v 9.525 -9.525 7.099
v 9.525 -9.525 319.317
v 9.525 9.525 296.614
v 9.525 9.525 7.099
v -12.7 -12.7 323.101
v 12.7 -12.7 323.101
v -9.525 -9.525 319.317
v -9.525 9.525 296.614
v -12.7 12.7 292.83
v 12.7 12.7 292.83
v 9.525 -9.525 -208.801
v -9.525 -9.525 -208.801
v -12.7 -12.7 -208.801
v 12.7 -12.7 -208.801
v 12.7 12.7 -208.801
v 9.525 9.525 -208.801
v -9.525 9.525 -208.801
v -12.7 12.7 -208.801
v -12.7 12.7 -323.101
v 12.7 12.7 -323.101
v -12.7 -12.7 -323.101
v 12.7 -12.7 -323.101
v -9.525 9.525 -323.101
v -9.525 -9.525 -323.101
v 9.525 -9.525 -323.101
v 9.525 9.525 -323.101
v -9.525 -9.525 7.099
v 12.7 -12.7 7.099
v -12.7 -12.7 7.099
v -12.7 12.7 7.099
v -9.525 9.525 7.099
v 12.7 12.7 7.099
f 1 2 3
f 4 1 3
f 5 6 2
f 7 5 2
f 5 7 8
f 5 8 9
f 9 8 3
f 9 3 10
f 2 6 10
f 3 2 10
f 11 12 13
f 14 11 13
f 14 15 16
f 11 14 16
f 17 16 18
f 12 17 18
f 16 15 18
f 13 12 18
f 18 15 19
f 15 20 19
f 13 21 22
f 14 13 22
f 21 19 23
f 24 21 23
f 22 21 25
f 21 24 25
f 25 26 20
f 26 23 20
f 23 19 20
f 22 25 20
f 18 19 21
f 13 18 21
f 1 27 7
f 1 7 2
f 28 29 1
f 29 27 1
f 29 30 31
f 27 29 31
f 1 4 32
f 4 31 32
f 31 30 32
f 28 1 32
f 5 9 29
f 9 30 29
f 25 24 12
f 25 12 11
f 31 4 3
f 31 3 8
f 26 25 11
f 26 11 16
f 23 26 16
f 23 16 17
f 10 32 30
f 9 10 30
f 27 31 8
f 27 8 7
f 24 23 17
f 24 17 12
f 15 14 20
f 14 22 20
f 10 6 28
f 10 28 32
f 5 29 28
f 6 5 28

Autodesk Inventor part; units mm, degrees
ref_plane "YZ Plane" through (0, 0, 0) normal (1, 0, 0) x (0, 1, 0)
ref_plane "XZ Plane" through (0, 0, 0) normal (0, 1, 0) x (-1, 0, 0)
ref_plane "XY Plane" through (0, 0, 0) normal (0, 0, 1) x (1, 0, 0)
sketch "Sketch1" plane through (0, 0, 0) normal (0, 0, 1) x (1, 0, 0)
  line L0 (-12.7, -12.7) -> (12.7, -12.7)
  line L1 (12.7, -12.7) -> (12.7, 12.7)
  line L2 (12.7, 12.7) -> (-12.7, 12.7)
  line L3 (-12.7, 12.7) -> (-12.7, -12.7)
  line L4 (-12.7, -12.7) -> (12.7, 12.7) construction
  line L5 (12.7, -12.7) -> (-12.7, 12.7) construction
  line L6 (-9.525, -9.525) -> (9.525, -9.525)
  line L7 (9.525, -9.525) -> (9.525, 9.525)
  line L8 (9.525, 9.525) -> (-9.525, 9.525)
  line L9 (-9.525, 9.525) -> (-9.525, -9.525)
  line L10 (-9.525, -9.525) -> (9.525, 9.525) construction
  line L11 (9.525, -9.525) -> (-9.525, 9.525) construction
  point P0 (0, 0)
  dimension "d0" = 25.4
  dimension "d1" = 25.4
  dimension "d2" = 3.175
extrude "Extrusion1" add sketch "Sketch1" along normal mid plane 646.2014
sketch "Sketch3" plane through (12.7, -12.7, 323.1007) normal (1, 0, 0) x (0, 0, -1)
  line L0 (646.2014, 0) -> (0, 0) projected
  line L1 (0, 0) -> (30.2705, 25.4)
  line L2 (0, 25.4) -> (646.2014, 25.4) projected
  line L3 (30.2705, 25.4) -> (0, 25.4)
  line L4 (0, 25.4) -> (0, 0) projected
  line L5 (0, 25.4) -> (0, 0)
  point P0 (323.1007, 12.7)
  dimension "d6" = 40
extrude "Extrusion2" cut sketch "Sketch3" against normal through all
sketch "Sketch4" plane through (-12.7, 12.7, -323.1007) normal (0, 1, 0) x (1, 0, 0)
  line L0 (0, -330.2) -> (25.4, -330.2) projected
  line L1 (25.4, -114.3) -> (0, -114.3) projected
  line L2 (25.4, -330.2) -> (0, -330.2)
  line L3 (0, -330.2) -> (0, -114.3)
  line L4 (0, -114.3) -> (25.4, -114.3)
  line L5 (25.4, -114.3) -> (25.4, -330.2)
  point P0 (12.7, -323.1007)
extrude "Extrusion3" cut sketch "Sketch4" against normal through all
properties part number "Aluminum1x1Base" material "Aluminum 6061"
